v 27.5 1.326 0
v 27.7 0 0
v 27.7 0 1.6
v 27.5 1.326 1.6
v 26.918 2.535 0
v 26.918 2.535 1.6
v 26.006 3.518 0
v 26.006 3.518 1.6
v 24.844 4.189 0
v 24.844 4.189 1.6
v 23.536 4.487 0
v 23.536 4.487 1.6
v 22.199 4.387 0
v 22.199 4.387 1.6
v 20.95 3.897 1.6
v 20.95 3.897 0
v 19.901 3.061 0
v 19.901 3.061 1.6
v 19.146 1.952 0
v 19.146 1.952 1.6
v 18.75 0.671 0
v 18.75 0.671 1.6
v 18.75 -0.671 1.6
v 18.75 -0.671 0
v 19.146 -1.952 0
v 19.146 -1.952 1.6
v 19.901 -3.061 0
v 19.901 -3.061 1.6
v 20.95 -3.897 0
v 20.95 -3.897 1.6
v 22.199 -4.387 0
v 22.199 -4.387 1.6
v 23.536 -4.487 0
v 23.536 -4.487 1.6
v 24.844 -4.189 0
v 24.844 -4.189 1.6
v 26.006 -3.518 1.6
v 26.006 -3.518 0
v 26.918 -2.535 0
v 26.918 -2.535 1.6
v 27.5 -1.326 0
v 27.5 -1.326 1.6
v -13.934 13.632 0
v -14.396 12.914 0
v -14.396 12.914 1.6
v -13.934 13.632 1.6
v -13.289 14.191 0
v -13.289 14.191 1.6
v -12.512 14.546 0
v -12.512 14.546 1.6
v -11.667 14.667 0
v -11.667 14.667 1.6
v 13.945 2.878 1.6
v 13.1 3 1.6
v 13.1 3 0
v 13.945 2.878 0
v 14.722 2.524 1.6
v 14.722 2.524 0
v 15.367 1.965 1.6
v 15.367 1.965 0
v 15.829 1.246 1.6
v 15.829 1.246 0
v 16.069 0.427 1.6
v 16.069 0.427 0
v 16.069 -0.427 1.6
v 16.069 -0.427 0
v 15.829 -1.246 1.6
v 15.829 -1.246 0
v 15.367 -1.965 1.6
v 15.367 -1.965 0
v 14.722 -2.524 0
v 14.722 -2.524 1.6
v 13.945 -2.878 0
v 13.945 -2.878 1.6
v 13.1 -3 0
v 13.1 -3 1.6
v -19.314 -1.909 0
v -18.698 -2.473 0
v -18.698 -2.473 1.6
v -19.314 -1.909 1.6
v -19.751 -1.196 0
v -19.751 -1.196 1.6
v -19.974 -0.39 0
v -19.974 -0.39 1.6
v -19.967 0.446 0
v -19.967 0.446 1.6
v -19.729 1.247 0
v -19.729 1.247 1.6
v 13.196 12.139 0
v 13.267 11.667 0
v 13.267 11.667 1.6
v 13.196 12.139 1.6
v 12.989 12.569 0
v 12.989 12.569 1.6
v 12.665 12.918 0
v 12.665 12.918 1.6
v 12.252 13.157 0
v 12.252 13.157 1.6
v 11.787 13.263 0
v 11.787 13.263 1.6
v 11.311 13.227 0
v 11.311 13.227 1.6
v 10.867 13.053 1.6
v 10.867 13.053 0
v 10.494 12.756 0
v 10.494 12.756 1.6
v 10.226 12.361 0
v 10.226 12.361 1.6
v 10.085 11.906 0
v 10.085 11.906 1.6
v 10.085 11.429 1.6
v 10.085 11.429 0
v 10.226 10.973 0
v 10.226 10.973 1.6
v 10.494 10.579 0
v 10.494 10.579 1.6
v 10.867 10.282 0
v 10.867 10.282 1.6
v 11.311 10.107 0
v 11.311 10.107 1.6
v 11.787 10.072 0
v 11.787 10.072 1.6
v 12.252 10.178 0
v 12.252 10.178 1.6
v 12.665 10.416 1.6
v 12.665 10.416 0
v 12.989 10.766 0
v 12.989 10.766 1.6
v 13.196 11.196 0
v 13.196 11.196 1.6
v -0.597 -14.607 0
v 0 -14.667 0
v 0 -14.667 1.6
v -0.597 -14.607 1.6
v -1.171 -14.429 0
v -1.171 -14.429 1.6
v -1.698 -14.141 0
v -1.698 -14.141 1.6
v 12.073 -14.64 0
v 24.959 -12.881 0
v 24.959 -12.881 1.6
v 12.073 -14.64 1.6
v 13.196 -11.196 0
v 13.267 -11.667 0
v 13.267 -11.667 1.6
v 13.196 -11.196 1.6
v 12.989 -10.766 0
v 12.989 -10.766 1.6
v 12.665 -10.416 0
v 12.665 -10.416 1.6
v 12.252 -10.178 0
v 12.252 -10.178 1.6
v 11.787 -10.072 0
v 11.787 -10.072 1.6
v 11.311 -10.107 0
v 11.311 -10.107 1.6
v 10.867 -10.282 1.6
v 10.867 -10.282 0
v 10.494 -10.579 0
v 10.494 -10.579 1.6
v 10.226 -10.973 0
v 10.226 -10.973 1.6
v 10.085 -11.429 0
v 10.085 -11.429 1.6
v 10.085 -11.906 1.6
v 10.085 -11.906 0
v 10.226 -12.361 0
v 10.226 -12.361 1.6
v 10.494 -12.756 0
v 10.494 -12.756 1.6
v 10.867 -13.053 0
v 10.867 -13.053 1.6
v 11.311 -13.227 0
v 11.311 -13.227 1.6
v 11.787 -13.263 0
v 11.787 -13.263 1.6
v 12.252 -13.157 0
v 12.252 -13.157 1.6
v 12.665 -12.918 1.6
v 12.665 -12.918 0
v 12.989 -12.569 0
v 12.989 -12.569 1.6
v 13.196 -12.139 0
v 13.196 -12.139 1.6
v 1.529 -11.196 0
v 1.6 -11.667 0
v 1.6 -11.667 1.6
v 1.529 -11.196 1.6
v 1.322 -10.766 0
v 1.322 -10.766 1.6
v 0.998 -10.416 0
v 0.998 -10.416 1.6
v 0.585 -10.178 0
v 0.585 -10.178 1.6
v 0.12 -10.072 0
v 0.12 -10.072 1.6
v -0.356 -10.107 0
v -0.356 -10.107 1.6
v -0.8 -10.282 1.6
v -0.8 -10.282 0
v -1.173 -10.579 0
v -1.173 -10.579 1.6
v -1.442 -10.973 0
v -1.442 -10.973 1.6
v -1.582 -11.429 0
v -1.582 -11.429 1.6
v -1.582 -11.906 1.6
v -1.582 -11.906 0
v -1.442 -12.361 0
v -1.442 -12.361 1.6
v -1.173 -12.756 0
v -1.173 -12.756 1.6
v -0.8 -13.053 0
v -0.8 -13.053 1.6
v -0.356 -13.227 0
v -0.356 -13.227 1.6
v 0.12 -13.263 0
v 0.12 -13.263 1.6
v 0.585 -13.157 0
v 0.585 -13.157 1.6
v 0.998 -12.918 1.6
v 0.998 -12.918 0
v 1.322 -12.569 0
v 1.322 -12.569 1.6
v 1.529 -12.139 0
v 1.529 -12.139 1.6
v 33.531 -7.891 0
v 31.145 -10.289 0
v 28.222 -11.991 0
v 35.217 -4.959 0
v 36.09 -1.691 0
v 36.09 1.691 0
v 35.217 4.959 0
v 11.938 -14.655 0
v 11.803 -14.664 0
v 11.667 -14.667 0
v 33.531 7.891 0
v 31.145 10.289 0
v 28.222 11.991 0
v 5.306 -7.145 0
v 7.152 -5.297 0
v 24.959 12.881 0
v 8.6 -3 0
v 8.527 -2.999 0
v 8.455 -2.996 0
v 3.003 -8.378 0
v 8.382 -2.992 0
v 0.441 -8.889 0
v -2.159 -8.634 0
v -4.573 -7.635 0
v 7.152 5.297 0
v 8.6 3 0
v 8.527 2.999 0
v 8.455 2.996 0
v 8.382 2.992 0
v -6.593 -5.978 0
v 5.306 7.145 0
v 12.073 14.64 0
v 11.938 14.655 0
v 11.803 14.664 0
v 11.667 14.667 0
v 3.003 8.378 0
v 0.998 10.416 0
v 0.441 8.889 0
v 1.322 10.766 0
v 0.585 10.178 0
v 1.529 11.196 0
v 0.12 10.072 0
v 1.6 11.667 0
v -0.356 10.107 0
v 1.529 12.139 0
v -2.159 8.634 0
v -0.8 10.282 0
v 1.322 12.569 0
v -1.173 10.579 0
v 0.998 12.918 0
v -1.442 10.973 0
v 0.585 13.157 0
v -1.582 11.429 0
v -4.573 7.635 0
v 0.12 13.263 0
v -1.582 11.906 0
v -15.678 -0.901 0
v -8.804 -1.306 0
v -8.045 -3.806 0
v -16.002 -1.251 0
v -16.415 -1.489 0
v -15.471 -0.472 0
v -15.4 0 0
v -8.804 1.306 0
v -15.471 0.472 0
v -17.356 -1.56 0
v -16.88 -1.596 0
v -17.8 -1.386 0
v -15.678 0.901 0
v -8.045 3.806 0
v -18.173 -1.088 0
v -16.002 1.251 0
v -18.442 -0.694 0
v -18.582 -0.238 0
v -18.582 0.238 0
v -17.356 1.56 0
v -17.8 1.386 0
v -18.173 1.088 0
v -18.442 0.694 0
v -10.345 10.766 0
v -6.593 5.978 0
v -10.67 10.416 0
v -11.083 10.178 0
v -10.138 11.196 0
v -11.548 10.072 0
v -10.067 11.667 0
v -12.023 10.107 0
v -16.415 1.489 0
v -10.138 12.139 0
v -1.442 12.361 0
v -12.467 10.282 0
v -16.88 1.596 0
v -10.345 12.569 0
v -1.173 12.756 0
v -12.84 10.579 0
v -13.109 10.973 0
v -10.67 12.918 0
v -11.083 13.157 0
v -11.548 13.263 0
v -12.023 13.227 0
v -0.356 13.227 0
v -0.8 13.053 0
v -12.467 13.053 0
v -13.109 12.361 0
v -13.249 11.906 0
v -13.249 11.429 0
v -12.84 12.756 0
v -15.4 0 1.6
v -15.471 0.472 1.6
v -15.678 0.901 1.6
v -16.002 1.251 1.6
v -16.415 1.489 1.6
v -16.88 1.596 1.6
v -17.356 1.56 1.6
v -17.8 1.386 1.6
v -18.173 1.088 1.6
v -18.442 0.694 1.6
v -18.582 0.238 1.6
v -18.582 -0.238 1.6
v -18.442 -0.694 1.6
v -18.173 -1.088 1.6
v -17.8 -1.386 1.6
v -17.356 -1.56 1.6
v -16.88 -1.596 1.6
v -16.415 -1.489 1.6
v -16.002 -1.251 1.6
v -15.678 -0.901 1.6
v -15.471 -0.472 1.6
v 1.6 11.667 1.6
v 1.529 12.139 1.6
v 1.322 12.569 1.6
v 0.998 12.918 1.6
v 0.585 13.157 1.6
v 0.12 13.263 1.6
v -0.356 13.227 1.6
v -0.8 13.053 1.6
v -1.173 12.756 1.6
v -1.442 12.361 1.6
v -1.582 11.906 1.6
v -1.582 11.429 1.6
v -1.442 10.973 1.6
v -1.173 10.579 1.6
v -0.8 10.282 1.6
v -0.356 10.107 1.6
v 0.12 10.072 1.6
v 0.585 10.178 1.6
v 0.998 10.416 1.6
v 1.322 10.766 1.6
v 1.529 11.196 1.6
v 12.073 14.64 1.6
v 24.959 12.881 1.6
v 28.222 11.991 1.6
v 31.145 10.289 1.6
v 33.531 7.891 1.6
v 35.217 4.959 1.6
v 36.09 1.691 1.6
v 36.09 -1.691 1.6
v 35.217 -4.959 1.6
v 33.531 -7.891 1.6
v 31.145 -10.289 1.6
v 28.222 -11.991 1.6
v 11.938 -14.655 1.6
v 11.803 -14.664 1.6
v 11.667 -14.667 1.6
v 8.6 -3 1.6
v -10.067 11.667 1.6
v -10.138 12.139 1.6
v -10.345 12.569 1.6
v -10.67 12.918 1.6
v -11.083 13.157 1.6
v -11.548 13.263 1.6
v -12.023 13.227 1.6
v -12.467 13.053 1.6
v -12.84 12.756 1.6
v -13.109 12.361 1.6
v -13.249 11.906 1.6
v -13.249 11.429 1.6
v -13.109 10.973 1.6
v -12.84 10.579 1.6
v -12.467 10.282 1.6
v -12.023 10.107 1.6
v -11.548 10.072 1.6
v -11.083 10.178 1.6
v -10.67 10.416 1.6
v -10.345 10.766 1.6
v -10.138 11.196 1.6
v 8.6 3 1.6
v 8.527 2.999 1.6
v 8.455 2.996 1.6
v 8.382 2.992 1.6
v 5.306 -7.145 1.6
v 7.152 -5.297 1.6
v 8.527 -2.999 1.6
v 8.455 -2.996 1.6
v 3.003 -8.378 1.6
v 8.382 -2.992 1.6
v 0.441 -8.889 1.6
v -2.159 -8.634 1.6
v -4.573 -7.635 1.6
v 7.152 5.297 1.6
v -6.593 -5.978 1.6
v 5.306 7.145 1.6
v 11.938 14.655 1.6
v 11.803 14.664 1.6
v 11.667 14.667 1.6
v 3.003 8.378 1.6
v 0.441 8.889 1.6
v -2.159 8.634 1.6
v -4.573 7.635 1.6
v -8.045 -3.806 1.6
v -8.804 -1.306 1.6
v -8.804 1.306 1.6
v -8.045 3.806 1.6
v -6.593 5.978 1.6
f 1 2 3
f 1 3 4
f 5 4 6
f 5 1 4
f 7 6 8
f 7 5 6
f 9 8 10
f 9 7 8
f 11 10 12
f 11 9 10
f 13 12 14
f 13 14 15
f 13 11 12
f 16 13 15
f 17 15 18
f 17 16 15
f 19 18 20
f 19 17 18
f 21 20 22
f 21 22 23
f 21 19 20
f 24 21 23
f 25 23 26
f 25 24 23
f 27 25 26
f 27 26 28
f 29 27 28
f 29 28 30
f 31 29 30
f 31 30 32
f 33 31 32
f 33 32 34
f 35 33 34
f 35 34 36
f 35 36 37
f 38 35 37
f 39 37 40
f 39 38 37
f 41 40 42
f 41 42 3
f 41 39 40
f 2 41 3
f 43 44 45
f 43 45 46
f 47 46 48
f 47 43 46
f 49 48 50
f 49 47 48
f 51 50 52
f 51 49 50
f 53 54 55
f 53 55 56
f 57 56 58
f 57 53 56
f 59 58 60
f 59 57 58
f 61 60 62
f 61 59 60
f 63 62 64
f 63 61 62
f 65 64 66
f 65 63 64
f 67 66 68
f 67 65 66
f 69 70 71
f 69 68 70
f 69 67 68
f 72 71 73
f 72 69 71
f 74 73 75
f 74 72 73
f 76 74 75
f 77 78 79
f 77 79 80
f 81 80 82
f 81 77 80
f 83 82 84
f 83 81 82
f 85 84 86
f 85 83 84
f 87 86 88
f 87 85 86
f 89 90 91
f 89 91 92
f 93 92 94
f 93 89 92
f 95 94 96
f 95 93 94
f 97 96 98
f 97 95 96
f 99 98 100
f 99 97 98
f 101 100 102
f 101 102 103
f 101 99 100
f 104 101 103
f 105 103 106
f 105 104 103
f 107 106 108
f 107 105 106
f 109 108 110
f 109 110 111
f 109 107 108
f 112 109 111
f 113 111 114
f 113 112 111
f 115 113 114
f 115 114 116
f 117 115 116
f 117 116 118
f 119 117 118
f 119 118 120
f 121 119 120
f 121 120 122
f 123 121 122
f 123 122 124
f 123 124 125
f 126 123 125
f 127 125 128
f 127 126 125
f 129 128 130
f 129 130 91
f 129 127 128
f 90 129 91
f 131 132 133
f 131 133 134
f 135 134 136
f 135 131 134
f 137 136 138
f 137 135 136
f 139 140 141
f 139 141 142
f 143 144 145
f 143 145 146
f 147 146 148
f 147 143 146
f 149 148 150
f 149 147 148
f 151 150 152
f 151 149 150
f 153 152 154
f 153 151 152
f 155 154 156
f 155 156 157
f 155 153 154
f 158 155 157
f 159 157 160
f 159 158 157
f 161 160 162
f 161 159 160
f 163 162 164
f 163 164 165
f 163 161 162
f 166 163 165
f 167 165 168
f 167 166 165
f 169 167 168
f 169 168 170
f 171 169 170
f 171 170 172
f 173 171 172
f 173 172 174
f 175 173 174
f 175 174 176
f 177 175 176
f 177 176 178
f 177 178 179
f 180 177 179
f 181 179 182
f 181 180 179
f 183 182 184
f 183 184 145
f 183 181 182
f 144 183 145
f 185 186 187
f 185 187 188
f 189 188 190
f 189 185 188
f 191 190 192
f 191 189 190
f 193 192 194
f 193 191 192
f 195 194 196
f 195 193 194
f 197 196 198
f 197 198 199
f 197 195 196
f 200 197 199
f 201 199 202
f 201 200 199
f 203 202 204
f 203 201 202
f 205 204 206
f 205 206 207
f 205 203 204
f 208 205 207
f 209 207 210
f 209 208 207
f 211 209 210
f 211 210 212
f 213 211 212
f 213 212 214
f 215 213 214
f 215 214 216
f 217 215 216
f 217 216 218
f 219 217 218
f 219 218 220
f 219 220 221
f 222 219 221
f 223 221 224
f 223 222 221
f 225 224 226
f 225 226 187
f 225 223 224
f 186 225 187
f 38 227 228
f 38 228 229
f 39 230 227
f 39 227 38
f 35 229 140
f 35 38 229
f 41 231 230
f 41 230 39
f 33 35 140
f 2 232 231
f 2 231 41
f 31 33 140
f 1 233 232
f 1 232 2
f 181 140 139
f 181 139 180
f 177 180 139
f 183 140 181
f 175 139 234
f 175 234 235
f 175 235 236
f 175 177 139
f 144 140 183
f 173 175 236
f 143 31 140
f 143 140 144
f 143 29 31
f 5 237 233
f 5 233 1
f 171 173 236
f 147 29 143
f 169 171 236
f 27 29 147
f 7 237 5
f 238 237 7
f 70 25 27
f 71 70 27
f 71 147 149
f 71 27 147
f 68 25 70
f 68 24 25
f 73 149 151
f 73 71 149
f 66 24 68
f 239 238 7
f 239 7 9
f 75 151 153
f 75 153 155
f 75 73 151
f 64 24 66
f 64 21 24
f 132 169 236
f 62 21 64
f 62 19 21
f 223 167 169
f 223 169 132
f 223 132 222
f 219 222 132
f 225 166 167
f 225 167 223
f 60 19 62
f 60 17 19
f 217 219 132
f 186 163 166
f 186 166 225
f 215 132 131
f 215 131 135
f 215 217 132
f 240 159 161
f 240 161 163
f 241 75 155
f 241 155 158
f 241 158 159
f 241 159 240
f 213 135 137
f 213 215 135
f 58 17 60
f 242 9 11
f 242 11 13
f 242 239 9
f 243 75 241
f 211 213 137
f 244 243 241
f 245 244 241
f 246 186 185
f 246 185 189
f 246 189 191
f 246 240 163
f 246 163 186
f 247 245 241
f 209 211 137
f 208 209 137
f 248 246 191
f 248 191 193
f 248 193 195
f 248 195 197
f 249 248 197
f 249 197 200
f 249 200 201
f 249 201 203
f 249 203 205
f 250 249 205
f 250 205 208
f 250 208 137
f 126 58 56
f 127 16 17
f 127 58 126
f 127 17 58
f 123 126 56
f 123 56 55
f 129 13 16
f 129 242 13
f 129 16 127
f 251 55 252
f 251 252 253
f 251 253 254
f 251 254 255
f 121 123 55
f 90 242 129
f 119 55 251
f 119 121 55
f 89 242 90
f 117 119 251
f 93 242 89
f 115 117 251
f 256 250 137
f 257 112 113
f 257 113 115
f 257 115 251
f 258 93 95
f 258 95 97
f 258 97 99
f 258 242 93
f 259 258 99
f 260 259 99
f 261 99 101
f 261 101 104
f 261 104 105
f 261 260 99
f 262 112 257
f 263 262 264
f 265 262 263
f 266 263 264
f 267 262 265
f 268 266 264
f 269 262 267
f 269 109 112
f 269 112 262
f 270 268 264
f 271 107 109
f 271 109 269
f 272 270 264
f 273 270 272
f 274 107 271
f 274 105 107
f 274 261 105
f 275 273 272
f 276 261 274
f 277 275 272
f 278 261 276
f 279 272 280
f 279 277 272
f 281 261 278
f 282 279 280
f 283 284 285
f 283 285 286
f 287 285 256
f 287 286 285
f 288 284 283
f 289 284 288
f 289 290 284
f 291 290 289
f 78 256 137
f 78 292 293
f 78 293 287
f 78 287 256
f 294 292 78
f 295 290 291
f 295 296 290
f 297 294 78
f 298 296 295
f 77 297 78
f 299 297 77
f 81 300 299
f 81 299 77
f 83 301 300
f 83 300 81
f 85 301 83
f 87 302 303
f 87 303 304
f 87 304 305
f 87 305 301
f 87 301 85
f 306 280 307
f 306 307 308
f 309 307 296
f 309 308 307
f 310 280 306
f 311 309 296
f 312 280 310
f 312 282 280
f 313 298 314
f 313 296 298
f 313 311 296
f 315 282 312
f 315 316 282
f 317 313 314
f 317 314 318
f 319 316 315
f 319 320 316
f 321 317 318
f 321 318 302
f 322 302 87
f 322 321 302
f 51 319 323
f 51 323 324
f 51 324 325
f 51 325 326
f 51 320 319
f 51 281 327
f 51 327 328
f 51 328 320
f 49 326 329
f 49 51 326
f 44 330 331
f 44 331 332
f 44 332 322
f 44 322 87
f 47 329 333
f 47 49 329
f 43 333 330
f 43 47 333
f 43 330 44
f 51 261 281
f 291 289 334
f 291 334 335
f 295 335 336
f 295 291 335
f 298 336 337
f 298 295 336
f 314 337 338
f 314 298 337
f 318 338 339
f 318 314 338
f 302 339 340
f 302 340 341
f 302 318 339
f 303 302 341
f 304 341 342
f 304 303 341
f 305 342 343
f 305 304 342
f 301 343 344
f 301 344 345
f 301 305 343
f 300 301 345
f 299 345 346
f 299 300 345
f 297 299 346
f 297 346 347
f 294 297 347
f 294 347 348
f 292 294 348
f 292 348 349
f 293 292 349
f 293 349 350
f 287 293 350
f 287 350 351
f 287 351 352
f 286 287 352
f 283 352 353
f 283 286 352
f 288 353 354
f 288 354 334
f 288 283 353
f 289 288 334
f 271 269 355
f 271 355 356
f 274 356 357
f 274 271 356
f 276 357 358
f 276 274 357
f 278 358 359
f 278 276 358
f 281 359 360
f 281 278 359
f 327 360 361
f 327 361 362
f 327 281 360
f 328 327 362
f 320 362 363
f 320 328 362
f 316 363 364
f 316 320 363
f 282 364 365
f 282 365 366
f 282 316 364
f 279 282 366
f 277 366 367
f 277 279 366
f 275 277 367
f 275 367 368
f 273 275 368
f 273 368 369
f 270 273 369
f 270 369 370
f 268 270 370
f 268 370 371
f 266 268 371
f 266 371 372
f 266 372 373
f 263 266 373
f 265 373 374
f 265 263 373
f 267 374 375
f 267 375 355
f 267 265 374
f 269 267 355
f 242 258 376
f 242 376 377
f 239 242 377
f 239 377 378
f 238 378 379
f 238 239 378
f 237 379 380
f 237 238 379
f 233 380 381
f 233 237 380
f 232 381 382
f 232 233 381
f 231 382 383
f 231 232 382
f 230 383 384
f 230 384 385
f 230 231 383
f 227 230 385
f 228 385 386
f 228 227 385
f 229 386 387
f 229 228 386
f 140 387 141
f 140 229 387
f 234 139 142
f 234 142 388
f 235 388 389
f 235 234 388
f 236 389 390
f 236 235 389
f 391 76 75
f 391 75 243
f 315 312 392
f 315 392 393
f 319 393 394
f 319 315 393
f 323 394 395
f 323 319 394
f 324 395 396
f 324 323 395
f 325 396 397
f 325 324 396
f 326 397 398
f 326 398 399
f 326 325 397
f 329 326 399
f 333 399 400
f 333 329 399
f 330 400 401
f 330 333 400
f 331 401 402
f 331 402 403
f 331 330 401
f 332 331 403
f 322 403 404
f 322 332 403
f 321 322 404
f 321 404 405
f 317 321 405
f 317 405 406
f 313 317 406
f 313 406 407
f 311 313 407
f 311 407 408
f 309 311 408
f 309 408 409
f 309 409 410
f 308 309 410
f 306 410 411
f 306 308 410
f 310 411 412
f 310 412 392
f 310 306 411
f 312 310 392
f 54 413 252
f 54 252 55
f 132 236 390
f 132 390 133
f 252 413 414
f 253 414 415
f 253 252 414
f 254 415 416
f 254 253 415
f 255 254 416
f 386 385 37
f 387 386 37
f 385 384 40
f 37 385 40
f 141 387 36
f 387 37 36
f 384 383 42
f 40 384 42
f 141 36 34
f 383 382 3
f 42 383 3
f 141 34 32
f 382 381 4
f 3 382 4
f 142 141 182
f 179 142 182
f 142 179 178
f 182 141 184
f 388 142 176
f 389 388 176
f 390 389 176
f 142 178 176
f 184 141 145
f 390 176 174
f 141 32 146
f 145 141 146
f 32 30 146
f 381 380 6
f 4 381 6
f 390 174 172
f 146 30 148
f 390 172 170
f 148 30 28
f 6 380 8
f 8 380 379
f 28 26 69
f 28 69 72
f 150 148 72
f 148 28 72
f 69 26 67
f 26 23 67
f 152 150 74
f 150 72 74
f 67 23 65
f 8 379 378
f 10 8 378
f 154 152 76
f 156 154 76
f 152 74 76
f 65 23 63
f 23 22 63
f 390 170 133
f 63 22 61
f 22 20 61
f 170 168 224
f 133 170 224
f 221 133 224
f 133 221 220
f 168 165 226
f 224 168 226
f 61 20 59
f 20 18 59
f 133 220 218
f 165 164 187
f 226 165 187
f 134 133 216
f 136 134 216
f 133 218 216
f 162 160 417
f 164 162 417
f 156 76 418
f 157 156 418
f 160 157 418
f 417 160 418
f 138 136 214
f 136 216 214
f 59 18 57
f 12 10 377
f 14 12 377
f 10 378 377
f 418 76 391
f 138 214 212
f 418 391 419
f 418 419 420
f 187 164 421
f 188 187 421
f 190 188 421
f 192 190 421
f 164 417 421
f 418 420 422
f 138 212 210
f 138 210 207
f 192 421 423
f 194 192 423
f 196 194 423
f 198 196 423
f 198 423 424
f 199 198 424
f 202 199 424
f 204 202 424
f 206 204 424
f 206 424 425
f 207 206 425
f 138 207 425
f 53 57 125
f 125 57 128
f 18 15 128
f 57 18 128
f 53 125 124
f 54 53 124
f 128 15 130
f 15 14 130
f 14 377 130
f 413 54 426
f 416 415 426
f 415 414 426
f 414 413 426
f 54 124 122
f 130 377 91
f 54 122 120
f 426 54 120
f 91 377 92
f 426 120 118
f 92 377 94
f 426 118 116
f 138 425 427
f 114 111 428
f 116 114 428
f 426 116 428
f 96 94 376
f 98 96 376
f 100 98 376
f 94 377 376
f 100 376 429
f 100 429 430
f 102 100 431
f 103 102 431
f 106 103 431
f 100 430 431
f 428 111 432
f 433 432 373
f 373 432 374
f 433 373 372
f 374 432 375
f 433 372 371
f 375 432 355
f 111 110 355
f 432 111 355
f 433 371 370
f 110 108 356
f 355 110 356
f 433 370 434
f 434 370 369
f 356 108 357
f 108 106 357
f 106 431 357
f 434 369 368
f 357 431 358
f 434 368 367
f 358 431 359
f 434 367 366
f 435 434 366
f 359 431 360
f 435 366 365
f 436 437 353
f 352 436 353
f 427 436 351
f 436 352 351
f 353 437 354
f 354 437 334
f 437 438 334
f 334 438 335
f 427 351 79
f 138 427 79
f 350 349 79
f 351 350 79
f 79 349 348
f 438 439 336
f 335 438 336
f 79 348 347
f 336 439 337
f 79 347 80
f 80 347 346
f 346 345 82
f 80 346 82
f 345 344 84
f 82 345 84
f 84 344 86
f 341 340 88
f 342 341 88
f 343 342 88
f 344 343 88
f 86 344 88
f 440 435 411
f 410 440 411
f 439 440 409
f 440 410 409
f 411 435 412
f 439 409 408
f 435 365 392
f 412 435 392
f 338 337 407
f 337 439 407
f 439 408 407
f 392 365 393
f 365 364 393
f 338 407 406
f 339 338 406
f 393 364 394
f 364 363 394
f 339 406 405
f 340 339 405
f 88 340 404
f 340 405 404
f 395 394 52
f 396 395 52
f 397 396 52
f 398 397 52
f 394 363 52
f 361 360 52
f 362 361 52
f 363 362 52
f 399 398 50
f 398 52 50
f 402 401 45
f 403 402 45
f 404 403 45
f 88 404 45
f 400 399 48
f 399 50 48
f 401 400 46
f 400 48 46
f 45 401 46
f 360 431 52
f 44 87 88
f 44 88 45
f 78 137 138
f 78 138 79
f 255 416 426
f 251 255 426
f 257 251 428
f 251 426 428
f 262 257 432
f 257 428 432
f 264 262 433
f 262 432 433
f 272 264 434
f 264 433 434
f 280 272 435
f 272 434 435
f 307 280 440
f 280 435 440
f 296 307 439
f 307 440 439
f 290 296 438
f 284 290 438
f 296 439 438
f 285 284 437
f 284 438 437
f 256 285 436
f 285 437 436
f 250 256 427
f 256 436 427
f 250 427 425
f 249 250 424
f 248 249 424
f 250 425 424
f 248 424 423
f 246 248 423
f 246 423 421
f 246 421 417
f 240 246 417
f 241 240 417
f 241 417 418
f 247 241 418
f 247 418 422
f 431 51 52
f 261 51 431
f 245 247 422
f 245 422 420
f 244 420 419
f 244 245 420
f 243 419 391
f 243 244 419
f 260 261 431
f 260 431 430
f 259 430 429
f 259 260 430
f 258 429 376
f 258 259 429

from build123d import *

# Parameters (mm, degrees)
SKETCH1_R           = 3
SKETCH1_R_2         = 4.5
SKETCH1_R_3         = 1.6
BOSS_EXTRUDE3_DEPTH = 1.6
CUT_EXTRUDE1_DEPTH  = 10
SKETCH3_R           = 8.9
CUT_EXTRUDE2_DEPTH  = 30


with BuildPart() as part:
    # Sketch1 → Boss-Extrude3 (new body)
    with BuildSketch(Plane.XY):
        with BuildLine():
            Line((12.073070054, 14.639688463), (24.958502044, 12.880515151))
            ThreePointArc((24.958502044, 12.880515151), (36.2, 0), (24.958502044, -12.880515151))
            Line((24.958502044, -12.880515151), (12.073070054, -14.639688463))
            ThreePointArc((12.073070054, -14.639688463), (11.870633815, -14.660360595), (11.66726189, -14.66726189))
            Line((11.66726189, -14.66726189), (0, -14.66726189))
            ThreePointArc((0, -14.66726189), (-0.888679088, -14.53261518), (-1.697586366, -14.140761542))
            Line((-1.697586366, -14.140761542), (-18.697586366, -2.473499652))
            ThreePointArc((-18.697586366, -2.473499652), (-19.891071988, -0.801063519), (-19.728500117, 1.247111507))
            Line((-19.728500117, 1.247111507), (-14.395762007, 12.914373397))
            ThreePointArc((-14.395762007, 12.914373397), (-13.288783625, 14.191279968), (-11.66726189, 14.66726189))
            Line((-11.66726189, 14.66726189), (11.66726189, 14.66726189))
            ThreePointArc((11.66726189, 14.66726189), (11.870633815, 14.660360595), (12.073070054, 14.639688463))
        make_face()
        Circle(SKETCH1_R, mode=Mode.SUBTRACT)
        with Locations((23.2, 0)):
            Circle(SKETCH1_R_2, mode=Mode.SUBTRACT)
        with Locations((8.6, 0)):
            Circle(SKETCH1_R, mode=Mode.SUBTRACT)
        with Locations((-17, 0)):
            Circle(SKETCH1_R_3, mode=Mode.SUBTRACT)
        with Locations((0, -11.66726189)):
            Circle(SKETCH1_R_3, mode=Mode.SUBTRACT)
        with Locations((11.66726189, -11.66726189)):
            Circle(SKETCH1_R_3, mode=Mode.SUBTRACT)
        with Locations((-11.66726189, 11.66726189)):
            Circle(SKETCH1_R_3, mode=Mode.SUBTRACT)
        with Locations((0, 11.66726189)):
            Circle(SKETCH1_R_3, mode=Mode.SUBTRACT)
        with Locations((11.66726189, 11.66726189)):
            Circle(SKETCH1_R_3, mode=Mode.SUBTRACT)
    extrude(amount=BOSS_EXTRUDE3_DEPTH)

    # Sketch2 → Cut-Extrude1 (cut)
    with BuildSketch(Plane.XY.offset(1.6)):
        with BuildLine():
            Line((8.6, 3), (13.1, 3))
            ThreePointArc((13.1, 3), (16.1, 0), (13.1, -3))
            Line((13.1, -3), (8.6, -3))
            ThreePointArc((8.6, -3), (5.6, 0), (8.6, 3))
        make_face()
    extrude(amount=-CUT_EXTRUDE1_DEPTH, mode=Mode.SUBTRACT)

    # Sketch3 → Cut-Extrude2 (cut)
    with BuildSketch(Plane.XY.offset(1.6)):
        Circle(SKETCH3_R)
    extrude(amount=-CUT_EXTRUDE2_DEPTH, mode=Mode.SUBTRACT)


solid = part.part
